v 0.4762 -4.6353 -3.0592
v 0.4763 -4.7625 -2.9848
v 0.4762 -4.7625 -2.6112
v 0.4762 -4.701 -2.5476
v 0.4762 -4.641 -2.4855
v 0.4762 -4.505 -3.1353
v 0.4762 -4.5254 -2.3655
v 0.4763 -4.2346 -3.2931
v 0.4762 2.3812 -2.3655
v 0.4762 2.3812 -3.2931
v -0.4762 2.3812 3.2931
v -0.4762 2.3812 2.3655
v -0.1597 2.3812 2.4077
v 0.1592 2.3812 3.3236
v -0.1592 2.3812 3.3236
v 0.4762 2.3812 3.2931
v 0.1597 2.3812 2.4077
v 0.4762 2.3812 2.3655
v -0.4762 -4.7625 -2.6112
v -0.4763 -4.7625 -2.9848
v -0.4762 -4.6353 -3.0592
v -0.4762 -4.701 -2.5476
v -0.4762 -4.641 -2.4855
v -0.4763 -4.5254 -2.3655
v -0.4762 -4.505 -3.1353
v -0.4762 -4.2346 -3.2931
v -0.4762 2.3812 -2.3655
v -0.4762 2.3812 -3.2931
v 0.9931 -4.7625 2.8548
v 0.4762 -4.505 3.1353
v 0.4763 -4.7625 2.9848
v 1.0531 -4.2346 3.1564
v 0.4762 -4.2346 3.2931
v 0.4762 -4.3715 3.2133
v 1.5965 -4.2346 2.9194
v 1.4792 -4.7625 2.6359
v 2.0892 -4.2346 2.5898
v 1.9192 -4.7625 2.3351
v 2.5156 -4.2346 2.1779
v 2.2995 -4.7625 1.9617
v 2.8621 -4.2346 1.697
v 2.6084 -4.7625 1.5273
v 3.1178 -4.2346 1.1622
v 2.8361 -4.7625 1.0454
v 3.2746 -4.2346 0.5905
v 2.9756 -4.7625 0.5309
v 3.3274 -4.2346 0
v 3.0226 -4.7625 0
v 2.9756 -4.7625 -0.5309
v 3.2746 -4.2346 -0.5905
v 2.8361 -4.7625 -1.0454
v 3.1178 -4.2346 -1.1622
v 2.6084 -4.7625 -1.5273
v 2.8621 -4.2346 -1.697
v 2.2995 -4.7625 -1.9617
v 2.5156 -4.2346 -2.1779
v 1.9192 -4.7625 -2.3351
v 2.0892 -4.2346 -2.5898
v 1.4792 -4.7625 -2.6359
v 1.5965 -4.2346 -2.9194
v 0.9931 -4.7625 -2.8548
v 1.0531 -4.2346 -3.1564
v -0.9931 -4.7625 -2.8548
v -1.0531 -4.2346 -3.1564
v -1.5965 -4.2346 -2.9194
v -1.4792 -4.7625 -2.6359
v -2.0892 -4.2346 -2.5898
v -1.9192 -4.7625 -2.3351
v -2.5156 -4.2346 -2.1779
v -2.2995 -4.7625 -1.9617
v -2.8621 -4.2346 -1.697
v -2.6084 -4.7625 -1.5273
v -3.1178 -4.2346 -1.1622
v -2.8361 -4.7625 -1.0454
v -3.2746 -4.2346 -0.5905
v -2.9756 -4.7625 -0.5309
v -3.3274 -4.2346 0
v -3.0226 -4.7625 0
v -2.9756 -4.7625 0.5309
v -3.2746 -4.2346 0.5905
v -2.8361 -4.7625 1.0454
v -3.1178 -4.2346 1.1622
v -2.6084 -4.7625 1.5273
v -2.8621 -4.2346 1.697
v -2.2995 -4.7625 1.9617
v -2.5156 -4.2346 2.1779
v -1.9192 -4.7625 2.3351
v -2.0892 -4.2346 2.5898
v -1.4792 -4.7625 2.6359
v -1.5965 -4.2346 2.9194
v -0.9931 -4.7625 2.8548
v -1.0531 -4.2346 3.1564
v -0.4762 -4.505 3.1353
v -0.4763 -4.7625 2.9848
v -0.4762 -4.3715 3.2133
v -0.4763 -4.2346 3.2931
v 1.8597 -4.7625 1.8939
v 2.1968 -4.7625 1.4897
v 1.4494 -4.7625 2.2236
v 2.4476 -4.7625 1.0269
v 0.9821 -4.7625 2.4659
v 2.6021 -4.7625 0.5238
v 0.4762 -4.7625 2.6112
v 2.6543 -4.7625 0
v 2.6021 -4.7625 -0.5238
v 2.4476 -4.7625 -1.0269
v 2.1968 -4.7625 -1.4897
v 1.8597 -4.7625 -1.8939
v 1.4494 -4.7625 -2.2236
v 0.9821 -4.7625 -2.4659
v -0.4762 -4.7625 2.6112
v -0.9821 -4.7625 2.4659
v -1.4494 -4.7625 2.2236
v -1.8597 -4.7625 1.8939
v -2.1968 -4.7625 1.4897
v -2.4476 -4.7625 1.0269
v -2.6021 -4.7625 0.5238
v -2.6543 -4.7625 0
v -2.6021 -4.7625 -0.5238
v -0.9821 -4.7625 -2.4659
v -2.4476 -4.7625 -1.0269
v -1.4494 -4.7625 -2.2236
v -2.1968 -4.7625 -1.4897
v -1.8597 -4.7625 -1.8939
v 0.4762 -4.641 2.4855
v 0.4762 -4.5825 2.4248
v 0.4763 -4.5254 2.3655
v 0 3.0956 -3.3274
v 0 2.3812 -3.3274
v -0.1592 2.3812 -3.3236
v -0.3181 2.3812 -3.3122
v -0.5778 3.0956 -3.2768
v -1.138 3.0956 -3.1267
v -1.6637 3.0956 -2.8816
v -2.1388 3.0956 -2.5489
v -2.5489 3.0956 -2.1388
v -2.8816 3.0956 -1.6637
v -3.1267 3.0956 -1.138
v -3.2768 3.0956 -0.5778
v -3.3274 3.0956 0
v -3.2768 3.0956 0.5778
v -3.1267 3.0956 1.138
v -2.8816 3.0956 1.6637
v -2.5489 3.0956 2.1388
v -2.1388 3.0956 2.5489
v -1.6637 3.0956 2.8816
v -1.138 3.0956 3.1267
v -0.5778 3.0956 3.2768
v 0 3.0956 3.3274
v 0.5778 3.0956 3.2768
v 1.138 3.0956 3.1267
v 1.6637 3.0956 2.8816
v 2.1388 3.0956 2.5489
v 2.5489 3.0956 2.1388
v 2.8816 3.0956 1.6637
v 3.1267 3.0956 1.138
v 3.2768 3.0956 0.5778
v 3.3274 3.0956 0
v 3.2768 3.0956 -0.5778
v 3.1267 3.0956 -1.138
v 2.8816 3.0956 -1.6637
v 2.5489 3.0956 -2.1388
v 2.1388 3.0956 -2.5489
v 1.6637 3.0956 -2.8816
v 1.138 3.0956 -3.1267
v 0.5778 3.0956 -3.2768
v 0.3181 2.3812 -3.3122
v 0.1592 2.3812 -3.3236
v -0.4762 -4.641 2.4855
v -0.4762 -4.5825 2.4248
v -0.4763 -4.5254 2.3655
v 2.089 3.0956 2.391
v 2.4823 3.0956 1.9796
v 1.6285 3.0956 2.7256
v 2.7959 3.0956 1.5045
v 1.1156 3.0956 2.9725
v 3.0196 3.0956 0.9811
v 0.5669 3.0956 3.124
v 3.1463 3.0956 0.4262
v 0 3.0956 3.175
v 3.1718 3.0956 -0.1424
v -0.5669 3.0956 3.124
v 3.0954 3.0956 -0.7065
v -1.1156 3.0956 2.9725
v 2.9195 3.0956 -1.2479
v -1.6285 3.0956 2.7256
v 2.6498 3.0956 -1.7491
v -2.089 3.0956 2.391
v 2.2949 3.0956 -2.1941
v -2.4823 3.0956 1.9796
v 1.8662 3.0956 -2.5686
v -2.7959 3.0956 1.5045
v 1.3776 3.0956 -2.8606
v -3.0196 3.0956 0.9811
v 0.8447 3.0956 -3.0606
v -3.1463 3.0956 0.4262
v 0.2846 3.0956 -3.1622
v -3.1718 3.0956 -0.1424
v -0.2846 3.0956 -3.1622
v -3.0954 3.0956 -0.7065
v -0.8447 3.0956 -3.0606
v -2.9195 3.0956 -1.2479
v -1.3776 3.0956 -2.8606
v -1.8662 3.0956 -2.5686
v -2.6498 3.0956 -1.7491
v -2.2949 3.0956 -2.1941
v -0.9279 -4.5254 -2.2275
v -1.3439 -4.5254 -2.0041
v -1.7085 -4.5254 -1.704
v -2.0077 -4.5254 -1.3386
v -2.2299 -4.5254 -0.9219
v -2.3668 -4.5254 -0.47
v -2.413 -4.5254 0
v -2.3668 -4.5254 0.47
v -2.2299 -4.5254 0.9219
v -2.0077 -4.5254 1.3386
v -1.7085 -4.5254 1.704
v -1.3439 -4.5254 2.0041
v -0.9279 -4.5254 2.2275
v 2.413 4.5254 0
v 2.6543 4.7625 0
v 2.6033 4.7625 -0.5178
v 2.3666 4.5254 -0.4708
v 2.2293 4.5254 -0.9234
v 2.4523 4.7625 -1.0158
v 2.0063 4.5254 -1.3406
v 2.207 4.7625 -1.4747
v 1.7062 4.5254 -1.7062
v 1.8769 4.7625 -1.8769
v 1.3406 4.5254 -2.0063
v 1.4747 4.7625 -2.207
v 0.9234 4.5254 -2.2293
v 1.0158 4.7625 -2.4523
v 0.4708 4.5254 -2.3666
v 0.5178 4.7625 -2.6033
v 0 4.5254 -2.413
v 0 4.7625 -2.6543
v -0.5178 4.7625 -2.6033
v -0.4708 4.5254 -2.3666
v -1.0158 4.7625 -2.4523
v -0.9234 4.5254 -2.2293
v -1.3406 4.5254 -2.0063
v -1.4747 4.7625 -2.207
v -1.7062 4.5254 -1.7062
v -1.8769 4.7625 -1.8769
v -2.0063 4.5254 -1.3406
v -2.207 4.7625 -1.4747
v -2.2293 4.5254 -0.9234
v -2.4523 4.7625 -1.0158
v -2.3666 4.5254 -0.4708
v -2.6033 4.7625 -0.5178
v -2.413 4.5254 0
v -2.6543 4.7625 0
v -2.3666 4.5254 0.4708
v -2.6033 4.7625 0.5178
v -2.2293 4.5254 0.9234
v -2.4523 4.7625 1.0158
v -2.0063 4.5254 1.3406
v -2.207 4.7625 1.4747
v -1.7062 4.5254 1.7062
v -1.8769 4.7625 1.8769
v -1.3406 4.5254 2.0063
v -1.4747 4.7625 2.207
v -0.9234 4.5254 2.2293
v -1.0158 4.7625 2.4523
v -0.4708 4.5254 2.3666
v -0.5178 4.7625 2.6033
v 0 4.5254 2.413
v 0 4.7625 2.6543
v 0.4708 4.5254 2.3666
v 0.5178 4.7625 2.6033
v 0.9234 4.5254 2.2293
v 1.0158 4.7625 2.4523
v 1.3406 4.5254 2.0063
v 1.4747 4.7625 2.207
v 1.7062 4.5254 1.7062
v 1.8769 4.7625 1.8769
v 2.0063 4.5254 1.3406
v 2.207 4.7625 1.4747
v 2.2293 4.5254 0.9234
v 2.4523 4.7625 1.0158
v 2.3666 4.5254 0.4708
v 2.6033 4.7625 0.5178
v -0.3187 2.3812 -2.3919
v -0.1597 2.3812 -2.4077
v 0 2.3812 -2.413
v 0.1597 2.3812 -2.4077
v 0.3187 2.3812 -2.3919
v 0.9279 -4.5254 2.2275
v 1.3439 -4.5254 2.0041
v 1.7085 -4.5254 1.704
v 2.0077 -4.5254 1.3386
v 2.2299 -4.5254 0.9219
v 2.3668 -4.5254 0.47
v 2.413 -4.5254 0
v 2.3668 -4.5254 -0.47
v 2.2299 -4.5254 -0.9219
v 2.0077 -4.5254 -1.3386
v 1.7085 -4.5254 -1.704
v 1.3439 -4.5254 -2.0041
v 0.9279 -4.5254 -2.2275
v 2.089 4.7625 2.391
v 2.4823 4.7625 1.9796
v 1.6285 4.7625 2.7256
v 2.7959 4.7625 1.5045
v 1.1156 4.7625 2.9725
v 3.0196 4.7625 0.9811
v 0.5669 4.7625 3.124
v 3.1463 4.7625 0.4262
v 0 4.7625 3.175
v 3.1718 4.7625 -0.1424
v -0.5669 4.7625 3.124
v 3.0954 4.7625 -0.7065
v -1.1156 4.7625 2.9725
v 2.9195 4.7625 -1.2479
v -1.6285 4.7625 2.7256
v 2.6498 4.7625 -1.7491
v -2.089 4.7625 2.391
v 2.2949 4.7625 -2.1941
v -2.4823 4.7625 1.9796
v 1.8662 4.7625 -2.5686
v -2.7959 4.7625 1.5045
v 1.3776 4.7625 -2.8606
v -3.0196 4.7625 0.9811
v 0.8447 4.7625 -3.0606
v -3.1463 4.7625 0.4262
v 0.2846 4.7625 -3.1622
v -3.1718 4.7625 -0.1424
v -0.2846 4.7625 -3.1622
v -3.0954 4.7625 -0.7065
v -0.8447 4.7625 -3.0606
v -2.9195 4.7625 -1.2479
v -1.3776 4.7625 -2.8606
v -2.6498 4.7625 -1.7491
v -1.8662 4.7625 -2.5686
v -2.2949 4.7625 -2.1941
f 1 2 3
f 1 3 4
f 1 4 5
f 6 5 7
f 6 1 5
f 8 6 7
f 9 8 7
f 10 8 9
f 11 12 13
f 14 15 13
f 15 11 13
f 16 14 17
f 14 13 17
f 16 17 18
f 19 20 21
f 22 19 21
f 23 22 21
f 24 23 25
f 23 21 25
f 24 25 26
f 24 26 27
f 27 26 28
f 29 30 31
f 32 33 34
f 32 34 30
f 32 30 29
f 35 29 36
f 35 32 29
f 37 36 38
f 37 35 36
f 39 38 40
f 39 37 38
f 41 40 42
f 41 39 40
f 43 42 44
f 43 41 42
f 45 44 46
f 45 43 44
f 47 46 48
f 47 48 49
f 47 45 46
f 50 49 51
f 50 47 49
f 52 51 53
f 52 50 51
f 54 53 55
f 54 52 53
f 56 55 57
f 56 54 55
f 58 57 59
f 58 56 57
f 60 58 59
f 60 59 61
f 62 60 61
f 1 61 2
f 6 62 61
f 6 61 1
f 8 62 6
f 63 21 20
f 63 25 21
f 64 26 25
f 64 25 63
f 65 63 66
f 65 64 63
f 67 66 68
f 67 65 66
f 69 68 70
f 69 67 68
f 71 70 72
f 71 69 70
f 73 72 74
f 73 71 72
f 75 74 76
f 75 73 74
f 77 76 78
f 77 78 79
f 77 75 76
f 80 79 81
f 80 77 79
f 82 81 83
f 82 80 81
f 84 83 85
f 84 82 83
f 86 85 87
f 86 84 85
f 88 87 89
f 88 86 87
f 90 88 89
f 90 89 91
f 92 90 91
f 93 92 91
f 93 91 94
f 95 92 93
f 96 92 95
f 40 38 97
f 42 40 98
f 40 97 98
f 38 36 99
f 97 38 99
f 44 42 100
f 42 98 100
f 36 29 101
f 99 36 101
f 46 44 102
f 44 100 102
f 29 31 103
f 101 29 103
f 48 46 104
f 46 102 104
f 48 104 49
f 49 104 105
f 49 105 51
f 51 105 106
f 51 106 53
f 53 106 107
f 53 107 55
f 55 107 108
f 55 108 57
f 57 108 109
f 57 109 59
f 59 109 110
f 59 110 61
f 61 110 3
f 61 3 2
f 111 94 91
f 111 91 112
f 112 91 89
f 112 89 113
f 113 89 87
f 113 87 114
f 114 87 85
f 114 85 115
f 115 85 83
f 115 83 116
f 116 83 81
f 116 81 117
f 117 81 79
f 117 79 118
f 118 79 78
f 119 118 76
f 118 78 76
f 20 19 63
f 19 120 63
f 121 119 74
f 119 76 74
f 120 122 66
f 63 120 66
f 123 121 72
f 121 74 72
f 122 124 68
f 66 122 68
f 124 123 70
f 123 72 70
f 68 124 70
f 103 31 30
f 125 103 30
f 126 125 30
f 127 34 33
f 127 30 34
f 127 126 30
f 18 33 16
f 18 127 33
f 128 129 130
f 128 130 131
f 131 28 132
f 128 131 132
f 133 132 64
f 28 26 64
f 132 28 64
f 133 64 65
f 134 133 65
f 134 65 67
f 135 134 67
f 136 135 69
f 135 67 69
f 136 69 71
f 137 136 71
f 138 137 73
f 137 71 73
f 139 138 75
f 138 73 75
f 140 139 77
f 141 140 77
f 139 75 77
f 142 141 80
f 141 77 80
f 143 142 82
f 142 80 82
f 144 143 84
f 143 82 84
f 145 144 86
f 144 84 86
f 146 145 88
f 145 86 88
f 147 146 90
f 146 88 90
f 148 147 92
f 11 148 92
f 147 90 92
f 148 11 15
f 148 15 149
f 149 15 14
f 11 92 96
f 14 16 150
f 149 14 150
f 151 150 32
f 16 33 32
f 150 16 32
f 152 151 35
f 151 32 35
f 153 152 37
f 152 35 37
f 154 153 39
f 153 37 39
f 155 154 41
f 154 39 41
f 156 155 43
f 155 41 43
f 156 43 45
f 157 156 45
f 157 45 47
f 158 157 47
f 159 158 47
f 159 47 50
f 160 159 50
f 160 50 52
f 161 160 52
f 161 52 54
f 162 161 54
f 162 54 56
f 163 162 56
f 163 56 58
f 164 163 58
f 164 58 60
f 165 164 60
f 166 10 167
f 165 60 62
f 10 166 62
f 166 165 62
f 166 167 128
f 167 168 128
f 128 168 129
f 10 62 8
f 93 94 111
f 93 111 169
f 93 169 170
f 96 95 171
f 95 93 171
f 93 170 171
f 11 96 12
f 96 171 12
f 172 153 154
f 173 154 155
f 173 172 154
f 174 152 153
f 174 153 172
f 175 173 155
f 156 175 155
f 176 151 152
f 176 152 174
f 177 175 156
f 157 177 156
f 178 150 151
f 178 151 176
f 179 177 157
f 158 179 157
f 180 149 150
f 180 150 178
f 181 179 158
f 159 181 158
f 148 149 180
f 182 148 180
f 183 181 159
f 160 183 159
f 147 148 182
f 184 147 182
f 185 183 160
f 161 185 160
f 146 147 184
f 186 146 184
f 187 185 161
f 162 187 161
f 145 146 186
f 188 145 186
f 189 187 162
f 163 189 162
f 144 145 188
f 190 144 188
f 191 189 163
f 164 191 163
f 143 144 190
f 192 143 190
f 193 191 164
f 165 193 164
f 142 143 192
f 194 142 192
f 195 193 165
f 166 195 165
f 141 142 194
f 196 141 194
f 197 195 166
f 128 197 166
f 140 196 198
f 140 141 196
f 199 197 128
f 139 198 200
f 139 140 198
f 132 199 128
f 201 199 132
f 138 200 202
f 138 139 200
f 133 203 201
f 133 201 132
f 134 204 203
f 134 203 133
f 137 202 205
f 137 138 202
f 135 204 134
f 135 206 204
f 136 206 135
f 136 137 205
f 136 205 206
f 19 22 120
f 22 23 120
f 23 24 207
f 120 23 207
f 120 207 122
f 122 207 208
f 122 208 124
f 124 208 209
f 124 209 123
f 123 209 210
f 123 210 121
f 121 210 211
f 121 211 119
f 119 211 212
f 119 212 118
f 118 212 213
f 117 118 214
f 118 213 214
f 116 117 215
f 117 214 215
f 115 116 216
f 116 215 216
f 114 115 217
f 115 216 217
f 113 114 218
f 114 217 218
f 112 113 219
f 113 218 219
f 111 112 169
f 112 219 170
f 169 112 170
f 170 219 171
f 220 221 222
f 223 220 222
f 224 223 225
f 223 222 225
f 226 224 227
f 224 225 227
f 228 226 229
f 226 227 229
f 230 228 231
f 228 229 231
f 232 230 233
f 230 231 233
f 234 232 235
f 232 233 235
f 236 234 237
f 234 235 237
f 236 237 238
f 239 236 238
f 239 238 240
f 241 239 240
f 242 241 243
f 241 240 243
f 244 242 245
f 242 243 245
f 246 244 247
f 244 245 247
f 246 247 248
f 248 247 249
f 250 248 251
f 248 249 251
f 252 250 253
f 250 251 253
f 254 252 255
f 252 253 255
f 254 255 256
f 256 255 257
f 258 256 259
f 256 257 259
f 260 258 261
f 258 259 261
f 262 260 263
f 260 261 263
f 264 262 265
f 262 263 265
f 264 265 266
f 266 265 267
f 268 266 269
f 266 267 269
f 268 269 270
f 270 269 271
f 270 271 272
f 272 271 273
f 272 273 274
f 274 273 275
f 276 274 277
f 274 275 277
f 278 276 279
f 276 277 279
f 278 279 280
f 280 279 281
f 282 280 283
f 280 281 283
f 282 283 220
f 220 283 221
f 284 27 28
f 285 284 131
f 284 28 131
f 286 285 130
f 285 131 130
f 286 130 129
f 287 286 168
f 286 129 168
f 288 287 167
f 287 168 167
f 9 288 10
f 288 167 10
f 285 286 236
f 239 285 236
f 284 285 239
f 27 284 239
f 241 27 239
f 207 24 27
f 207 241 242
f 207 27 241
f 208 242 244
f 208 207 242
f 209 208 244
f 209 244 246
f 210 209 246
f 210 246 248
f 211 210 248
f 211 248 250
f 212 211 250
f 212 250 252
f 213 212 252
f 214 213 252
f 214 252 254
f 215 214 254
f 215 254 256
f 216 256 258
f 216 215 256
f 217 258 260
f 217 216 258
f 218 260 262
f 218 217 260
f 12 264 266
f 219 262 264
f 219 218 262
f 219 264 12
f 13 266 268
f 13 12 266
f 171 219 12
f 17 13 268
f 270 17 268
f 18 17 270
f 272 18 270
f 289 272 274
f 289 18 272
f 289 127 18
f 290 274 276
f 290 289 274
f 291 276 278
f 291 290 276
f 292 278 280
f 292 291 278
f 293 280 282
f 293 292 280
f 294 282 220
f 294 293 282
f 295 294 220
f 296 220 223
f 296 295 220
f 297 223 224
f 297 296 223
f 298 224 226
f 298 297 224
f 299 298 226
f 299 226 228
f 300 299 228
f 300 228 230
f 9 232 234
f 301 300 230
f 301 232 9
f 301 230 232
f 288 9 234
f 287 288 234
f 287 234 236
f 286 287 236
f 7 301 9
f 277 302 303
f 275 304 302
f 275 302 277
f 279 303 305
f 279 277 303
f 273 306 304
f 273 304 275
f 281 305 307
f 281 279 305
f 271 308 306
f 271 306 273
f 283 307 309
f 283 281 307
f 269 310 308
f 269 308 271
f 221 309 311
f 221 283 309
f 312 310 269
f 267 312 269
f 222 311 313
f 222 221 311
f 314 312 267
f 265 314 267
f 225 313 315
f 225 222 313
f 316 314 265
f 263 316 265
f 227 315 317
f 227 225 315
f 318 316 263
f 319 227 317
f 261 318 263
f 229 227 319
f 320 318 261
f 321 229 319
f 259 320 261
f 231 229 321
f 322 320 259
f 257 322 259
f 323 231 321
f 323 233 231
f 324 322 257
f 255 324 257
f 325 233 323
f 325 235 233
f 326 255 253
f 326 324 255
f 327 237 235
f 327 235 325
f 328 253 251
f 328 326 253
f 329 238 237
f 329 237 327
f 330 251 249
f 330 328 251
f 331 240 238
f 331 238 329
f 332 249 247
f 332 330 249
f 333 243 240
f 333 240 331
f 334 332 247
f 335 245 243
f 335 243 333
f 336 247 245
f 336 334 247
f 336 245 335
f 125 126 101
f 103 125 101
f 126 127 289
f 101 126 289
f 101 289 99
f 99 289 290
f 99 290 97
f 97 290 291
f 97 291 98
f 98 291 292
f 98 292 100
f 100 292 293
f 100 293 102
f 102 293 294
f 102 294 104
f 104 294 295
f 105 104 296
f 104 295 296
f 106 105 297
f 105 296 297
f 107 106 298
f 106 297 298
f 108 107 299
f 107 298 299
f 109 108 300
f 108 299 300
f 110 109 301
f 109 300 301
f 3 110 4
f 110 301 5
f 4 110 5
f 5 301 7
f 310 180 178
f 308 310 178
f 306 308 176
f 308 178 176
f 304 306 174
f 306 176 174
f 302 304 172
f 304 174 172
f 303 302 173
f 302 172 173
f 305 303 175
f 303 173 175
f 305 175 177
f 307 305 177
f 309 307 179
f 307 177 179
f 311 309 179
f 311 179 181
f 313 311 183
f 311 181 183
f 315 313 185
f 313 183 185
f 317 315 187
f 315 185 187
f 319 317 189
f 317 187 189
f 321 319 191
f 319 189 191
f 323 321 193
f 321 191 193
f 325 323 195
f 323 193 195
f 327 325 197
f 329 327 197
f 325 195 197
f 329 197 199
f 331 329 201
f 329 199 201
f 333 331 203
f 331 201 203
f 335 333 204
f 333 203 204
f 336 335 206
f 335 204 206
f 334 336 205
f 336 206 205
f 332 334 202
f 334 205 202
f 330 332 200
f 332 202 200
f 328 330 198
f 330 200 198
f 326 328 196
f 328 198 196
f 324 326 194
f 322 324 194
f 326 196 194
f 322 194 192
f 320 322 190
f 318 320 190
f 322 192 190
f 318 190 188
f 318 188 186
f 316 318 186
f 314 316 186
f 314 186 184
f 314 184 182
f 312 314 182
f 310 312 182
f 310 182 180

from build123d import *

# Parameters (mm, degrees)
BOSS_EXTRUDE1_DEPTH      = 4.7625
BOSS_EXTRUDE1_DEPTH_BACK = 4.7625
SKETCH11_R               = 3.3274
SKETCH11_R_2             = 2.413
CUT_EXTRUDE1_START       = 3.095625
SKETCH12_R               = 3.3274
SKETCH12_R_2             = 3.175
CUT_EXTRUDE1_DEPTH       = 1.666875
CHAMFER2_SIZE            = 0.3048
CHAMFER2_SIZE2           = 0.527929086
EXTRUDE4_DEPTH           = 7.695116711
EXTRUDE4_DEPTH_BACK      = 7.695116711
SKETCH8_W                = 0.9525
SKETCH8_H                = 7.14375


# Read off the part's stored shape, not the designer's step: Cut-Extrude3, Cut-Extrude10
with BuildPart() as part:
    # Sketch11 → Boss-Extrude1 (new, two sides: drawn at the far end of the back side and taken through both)
    with BuildSketch(Plane(origin=(0, 0, 0), x_dir=(1, 0, 0), z_dir=(0, 1, 0)).offset(-BOSS_EXTRUDE1_DEPTH_BACK)):
        with Locations(Location((0, 0, 0), (0, 0, 90))):
            Circle(SKETCH11_R)
        with Locations(Location((0, 0, 0), (0, 0, 90))):
            Circle(SKETCH11_R_2, mode=Mode.SUBTRACT)
    extrude(amount=BOSS_EXTRUDE1_DEPTH + BOSS_EXTRUDE1_DEPTH_BACK)

    # Sketch12 → Cut-Extrude1 (cut)
    with BuildSketch(Plane(origin=(0, 0, 0), x_dir=(1, 0, 0), z_dir=(0, 1, 0)).offset(CUT_EXTRUDE1_START)):
        with Locations(Location((0, 0, 0), (0, 0, 90))):
            Circle(SKETCH12_R)
        with Locations(Location((0, 0, 0), (0, 0, 270))):
            Circle(SKETCH12_R_2, mode=Mode.SUBTRACT)
    extrude(amount=CUT_EXTRUDE1_DEPTH, mode=Mode.SUBTRACT)

    # Cut-Extrude3 outline → Cut-Extrude3 (revolve, cut)
    with BuildSketch(Plane.XY):
        Polygon((2.413, 4.7625), (2.413, 4.52537515), (2.6543, 4.7625), align=None)
    revolve(axis=Axis((0, 0, 0), (0, 1, 0)), mode=Mode.SUBTRACT)

    # Cut-Extrude10 outline → Cut-Extrude10 (revolve, cut)
    with BuildSketch(Plane.XY):
        Polygon((2.6543, -4.7625), (2.413, -4.52537515), (2.413, -4.7625), align=None)
    revolve(axis=Axis((0, 0, 0), (0, 1, 0)), mode=Mode.SUBTRACT)

    # Chamfer2
    chamfer2_edges = [part.edges().sort_by_distance(p)[0] for p in [
        (0, -4.7625, 3.3274),
    ]]
    chamfer2_side = [part.faces().sort_by_distance(p)[0] for p in [
        (0, -4.7625, 3.233286916),
    ]]
    chamfer(chamfer2_edges, length=CHAMFER2_SIZE, length2=CHAMFER2_SIZE2, reference=chamfer2_side[0])

    # Sketch8 → Extrude4 (cut, two sides: drawn at the far end of the back side and taken through both)
    with BuildSketch(Plane.XY.offset(-EXTRUDE4_DEPTH_BACK)):
        with Locations((0, -1.190625)):
            Rectangle(SKETCH8_W, SKETCH8_H)
    extrude(amount=EXTRUDE4_DEPTH + EXTRUDE4_DEPTH_BACK, mode=Mode.SUBTRACT)


solid = part.part
